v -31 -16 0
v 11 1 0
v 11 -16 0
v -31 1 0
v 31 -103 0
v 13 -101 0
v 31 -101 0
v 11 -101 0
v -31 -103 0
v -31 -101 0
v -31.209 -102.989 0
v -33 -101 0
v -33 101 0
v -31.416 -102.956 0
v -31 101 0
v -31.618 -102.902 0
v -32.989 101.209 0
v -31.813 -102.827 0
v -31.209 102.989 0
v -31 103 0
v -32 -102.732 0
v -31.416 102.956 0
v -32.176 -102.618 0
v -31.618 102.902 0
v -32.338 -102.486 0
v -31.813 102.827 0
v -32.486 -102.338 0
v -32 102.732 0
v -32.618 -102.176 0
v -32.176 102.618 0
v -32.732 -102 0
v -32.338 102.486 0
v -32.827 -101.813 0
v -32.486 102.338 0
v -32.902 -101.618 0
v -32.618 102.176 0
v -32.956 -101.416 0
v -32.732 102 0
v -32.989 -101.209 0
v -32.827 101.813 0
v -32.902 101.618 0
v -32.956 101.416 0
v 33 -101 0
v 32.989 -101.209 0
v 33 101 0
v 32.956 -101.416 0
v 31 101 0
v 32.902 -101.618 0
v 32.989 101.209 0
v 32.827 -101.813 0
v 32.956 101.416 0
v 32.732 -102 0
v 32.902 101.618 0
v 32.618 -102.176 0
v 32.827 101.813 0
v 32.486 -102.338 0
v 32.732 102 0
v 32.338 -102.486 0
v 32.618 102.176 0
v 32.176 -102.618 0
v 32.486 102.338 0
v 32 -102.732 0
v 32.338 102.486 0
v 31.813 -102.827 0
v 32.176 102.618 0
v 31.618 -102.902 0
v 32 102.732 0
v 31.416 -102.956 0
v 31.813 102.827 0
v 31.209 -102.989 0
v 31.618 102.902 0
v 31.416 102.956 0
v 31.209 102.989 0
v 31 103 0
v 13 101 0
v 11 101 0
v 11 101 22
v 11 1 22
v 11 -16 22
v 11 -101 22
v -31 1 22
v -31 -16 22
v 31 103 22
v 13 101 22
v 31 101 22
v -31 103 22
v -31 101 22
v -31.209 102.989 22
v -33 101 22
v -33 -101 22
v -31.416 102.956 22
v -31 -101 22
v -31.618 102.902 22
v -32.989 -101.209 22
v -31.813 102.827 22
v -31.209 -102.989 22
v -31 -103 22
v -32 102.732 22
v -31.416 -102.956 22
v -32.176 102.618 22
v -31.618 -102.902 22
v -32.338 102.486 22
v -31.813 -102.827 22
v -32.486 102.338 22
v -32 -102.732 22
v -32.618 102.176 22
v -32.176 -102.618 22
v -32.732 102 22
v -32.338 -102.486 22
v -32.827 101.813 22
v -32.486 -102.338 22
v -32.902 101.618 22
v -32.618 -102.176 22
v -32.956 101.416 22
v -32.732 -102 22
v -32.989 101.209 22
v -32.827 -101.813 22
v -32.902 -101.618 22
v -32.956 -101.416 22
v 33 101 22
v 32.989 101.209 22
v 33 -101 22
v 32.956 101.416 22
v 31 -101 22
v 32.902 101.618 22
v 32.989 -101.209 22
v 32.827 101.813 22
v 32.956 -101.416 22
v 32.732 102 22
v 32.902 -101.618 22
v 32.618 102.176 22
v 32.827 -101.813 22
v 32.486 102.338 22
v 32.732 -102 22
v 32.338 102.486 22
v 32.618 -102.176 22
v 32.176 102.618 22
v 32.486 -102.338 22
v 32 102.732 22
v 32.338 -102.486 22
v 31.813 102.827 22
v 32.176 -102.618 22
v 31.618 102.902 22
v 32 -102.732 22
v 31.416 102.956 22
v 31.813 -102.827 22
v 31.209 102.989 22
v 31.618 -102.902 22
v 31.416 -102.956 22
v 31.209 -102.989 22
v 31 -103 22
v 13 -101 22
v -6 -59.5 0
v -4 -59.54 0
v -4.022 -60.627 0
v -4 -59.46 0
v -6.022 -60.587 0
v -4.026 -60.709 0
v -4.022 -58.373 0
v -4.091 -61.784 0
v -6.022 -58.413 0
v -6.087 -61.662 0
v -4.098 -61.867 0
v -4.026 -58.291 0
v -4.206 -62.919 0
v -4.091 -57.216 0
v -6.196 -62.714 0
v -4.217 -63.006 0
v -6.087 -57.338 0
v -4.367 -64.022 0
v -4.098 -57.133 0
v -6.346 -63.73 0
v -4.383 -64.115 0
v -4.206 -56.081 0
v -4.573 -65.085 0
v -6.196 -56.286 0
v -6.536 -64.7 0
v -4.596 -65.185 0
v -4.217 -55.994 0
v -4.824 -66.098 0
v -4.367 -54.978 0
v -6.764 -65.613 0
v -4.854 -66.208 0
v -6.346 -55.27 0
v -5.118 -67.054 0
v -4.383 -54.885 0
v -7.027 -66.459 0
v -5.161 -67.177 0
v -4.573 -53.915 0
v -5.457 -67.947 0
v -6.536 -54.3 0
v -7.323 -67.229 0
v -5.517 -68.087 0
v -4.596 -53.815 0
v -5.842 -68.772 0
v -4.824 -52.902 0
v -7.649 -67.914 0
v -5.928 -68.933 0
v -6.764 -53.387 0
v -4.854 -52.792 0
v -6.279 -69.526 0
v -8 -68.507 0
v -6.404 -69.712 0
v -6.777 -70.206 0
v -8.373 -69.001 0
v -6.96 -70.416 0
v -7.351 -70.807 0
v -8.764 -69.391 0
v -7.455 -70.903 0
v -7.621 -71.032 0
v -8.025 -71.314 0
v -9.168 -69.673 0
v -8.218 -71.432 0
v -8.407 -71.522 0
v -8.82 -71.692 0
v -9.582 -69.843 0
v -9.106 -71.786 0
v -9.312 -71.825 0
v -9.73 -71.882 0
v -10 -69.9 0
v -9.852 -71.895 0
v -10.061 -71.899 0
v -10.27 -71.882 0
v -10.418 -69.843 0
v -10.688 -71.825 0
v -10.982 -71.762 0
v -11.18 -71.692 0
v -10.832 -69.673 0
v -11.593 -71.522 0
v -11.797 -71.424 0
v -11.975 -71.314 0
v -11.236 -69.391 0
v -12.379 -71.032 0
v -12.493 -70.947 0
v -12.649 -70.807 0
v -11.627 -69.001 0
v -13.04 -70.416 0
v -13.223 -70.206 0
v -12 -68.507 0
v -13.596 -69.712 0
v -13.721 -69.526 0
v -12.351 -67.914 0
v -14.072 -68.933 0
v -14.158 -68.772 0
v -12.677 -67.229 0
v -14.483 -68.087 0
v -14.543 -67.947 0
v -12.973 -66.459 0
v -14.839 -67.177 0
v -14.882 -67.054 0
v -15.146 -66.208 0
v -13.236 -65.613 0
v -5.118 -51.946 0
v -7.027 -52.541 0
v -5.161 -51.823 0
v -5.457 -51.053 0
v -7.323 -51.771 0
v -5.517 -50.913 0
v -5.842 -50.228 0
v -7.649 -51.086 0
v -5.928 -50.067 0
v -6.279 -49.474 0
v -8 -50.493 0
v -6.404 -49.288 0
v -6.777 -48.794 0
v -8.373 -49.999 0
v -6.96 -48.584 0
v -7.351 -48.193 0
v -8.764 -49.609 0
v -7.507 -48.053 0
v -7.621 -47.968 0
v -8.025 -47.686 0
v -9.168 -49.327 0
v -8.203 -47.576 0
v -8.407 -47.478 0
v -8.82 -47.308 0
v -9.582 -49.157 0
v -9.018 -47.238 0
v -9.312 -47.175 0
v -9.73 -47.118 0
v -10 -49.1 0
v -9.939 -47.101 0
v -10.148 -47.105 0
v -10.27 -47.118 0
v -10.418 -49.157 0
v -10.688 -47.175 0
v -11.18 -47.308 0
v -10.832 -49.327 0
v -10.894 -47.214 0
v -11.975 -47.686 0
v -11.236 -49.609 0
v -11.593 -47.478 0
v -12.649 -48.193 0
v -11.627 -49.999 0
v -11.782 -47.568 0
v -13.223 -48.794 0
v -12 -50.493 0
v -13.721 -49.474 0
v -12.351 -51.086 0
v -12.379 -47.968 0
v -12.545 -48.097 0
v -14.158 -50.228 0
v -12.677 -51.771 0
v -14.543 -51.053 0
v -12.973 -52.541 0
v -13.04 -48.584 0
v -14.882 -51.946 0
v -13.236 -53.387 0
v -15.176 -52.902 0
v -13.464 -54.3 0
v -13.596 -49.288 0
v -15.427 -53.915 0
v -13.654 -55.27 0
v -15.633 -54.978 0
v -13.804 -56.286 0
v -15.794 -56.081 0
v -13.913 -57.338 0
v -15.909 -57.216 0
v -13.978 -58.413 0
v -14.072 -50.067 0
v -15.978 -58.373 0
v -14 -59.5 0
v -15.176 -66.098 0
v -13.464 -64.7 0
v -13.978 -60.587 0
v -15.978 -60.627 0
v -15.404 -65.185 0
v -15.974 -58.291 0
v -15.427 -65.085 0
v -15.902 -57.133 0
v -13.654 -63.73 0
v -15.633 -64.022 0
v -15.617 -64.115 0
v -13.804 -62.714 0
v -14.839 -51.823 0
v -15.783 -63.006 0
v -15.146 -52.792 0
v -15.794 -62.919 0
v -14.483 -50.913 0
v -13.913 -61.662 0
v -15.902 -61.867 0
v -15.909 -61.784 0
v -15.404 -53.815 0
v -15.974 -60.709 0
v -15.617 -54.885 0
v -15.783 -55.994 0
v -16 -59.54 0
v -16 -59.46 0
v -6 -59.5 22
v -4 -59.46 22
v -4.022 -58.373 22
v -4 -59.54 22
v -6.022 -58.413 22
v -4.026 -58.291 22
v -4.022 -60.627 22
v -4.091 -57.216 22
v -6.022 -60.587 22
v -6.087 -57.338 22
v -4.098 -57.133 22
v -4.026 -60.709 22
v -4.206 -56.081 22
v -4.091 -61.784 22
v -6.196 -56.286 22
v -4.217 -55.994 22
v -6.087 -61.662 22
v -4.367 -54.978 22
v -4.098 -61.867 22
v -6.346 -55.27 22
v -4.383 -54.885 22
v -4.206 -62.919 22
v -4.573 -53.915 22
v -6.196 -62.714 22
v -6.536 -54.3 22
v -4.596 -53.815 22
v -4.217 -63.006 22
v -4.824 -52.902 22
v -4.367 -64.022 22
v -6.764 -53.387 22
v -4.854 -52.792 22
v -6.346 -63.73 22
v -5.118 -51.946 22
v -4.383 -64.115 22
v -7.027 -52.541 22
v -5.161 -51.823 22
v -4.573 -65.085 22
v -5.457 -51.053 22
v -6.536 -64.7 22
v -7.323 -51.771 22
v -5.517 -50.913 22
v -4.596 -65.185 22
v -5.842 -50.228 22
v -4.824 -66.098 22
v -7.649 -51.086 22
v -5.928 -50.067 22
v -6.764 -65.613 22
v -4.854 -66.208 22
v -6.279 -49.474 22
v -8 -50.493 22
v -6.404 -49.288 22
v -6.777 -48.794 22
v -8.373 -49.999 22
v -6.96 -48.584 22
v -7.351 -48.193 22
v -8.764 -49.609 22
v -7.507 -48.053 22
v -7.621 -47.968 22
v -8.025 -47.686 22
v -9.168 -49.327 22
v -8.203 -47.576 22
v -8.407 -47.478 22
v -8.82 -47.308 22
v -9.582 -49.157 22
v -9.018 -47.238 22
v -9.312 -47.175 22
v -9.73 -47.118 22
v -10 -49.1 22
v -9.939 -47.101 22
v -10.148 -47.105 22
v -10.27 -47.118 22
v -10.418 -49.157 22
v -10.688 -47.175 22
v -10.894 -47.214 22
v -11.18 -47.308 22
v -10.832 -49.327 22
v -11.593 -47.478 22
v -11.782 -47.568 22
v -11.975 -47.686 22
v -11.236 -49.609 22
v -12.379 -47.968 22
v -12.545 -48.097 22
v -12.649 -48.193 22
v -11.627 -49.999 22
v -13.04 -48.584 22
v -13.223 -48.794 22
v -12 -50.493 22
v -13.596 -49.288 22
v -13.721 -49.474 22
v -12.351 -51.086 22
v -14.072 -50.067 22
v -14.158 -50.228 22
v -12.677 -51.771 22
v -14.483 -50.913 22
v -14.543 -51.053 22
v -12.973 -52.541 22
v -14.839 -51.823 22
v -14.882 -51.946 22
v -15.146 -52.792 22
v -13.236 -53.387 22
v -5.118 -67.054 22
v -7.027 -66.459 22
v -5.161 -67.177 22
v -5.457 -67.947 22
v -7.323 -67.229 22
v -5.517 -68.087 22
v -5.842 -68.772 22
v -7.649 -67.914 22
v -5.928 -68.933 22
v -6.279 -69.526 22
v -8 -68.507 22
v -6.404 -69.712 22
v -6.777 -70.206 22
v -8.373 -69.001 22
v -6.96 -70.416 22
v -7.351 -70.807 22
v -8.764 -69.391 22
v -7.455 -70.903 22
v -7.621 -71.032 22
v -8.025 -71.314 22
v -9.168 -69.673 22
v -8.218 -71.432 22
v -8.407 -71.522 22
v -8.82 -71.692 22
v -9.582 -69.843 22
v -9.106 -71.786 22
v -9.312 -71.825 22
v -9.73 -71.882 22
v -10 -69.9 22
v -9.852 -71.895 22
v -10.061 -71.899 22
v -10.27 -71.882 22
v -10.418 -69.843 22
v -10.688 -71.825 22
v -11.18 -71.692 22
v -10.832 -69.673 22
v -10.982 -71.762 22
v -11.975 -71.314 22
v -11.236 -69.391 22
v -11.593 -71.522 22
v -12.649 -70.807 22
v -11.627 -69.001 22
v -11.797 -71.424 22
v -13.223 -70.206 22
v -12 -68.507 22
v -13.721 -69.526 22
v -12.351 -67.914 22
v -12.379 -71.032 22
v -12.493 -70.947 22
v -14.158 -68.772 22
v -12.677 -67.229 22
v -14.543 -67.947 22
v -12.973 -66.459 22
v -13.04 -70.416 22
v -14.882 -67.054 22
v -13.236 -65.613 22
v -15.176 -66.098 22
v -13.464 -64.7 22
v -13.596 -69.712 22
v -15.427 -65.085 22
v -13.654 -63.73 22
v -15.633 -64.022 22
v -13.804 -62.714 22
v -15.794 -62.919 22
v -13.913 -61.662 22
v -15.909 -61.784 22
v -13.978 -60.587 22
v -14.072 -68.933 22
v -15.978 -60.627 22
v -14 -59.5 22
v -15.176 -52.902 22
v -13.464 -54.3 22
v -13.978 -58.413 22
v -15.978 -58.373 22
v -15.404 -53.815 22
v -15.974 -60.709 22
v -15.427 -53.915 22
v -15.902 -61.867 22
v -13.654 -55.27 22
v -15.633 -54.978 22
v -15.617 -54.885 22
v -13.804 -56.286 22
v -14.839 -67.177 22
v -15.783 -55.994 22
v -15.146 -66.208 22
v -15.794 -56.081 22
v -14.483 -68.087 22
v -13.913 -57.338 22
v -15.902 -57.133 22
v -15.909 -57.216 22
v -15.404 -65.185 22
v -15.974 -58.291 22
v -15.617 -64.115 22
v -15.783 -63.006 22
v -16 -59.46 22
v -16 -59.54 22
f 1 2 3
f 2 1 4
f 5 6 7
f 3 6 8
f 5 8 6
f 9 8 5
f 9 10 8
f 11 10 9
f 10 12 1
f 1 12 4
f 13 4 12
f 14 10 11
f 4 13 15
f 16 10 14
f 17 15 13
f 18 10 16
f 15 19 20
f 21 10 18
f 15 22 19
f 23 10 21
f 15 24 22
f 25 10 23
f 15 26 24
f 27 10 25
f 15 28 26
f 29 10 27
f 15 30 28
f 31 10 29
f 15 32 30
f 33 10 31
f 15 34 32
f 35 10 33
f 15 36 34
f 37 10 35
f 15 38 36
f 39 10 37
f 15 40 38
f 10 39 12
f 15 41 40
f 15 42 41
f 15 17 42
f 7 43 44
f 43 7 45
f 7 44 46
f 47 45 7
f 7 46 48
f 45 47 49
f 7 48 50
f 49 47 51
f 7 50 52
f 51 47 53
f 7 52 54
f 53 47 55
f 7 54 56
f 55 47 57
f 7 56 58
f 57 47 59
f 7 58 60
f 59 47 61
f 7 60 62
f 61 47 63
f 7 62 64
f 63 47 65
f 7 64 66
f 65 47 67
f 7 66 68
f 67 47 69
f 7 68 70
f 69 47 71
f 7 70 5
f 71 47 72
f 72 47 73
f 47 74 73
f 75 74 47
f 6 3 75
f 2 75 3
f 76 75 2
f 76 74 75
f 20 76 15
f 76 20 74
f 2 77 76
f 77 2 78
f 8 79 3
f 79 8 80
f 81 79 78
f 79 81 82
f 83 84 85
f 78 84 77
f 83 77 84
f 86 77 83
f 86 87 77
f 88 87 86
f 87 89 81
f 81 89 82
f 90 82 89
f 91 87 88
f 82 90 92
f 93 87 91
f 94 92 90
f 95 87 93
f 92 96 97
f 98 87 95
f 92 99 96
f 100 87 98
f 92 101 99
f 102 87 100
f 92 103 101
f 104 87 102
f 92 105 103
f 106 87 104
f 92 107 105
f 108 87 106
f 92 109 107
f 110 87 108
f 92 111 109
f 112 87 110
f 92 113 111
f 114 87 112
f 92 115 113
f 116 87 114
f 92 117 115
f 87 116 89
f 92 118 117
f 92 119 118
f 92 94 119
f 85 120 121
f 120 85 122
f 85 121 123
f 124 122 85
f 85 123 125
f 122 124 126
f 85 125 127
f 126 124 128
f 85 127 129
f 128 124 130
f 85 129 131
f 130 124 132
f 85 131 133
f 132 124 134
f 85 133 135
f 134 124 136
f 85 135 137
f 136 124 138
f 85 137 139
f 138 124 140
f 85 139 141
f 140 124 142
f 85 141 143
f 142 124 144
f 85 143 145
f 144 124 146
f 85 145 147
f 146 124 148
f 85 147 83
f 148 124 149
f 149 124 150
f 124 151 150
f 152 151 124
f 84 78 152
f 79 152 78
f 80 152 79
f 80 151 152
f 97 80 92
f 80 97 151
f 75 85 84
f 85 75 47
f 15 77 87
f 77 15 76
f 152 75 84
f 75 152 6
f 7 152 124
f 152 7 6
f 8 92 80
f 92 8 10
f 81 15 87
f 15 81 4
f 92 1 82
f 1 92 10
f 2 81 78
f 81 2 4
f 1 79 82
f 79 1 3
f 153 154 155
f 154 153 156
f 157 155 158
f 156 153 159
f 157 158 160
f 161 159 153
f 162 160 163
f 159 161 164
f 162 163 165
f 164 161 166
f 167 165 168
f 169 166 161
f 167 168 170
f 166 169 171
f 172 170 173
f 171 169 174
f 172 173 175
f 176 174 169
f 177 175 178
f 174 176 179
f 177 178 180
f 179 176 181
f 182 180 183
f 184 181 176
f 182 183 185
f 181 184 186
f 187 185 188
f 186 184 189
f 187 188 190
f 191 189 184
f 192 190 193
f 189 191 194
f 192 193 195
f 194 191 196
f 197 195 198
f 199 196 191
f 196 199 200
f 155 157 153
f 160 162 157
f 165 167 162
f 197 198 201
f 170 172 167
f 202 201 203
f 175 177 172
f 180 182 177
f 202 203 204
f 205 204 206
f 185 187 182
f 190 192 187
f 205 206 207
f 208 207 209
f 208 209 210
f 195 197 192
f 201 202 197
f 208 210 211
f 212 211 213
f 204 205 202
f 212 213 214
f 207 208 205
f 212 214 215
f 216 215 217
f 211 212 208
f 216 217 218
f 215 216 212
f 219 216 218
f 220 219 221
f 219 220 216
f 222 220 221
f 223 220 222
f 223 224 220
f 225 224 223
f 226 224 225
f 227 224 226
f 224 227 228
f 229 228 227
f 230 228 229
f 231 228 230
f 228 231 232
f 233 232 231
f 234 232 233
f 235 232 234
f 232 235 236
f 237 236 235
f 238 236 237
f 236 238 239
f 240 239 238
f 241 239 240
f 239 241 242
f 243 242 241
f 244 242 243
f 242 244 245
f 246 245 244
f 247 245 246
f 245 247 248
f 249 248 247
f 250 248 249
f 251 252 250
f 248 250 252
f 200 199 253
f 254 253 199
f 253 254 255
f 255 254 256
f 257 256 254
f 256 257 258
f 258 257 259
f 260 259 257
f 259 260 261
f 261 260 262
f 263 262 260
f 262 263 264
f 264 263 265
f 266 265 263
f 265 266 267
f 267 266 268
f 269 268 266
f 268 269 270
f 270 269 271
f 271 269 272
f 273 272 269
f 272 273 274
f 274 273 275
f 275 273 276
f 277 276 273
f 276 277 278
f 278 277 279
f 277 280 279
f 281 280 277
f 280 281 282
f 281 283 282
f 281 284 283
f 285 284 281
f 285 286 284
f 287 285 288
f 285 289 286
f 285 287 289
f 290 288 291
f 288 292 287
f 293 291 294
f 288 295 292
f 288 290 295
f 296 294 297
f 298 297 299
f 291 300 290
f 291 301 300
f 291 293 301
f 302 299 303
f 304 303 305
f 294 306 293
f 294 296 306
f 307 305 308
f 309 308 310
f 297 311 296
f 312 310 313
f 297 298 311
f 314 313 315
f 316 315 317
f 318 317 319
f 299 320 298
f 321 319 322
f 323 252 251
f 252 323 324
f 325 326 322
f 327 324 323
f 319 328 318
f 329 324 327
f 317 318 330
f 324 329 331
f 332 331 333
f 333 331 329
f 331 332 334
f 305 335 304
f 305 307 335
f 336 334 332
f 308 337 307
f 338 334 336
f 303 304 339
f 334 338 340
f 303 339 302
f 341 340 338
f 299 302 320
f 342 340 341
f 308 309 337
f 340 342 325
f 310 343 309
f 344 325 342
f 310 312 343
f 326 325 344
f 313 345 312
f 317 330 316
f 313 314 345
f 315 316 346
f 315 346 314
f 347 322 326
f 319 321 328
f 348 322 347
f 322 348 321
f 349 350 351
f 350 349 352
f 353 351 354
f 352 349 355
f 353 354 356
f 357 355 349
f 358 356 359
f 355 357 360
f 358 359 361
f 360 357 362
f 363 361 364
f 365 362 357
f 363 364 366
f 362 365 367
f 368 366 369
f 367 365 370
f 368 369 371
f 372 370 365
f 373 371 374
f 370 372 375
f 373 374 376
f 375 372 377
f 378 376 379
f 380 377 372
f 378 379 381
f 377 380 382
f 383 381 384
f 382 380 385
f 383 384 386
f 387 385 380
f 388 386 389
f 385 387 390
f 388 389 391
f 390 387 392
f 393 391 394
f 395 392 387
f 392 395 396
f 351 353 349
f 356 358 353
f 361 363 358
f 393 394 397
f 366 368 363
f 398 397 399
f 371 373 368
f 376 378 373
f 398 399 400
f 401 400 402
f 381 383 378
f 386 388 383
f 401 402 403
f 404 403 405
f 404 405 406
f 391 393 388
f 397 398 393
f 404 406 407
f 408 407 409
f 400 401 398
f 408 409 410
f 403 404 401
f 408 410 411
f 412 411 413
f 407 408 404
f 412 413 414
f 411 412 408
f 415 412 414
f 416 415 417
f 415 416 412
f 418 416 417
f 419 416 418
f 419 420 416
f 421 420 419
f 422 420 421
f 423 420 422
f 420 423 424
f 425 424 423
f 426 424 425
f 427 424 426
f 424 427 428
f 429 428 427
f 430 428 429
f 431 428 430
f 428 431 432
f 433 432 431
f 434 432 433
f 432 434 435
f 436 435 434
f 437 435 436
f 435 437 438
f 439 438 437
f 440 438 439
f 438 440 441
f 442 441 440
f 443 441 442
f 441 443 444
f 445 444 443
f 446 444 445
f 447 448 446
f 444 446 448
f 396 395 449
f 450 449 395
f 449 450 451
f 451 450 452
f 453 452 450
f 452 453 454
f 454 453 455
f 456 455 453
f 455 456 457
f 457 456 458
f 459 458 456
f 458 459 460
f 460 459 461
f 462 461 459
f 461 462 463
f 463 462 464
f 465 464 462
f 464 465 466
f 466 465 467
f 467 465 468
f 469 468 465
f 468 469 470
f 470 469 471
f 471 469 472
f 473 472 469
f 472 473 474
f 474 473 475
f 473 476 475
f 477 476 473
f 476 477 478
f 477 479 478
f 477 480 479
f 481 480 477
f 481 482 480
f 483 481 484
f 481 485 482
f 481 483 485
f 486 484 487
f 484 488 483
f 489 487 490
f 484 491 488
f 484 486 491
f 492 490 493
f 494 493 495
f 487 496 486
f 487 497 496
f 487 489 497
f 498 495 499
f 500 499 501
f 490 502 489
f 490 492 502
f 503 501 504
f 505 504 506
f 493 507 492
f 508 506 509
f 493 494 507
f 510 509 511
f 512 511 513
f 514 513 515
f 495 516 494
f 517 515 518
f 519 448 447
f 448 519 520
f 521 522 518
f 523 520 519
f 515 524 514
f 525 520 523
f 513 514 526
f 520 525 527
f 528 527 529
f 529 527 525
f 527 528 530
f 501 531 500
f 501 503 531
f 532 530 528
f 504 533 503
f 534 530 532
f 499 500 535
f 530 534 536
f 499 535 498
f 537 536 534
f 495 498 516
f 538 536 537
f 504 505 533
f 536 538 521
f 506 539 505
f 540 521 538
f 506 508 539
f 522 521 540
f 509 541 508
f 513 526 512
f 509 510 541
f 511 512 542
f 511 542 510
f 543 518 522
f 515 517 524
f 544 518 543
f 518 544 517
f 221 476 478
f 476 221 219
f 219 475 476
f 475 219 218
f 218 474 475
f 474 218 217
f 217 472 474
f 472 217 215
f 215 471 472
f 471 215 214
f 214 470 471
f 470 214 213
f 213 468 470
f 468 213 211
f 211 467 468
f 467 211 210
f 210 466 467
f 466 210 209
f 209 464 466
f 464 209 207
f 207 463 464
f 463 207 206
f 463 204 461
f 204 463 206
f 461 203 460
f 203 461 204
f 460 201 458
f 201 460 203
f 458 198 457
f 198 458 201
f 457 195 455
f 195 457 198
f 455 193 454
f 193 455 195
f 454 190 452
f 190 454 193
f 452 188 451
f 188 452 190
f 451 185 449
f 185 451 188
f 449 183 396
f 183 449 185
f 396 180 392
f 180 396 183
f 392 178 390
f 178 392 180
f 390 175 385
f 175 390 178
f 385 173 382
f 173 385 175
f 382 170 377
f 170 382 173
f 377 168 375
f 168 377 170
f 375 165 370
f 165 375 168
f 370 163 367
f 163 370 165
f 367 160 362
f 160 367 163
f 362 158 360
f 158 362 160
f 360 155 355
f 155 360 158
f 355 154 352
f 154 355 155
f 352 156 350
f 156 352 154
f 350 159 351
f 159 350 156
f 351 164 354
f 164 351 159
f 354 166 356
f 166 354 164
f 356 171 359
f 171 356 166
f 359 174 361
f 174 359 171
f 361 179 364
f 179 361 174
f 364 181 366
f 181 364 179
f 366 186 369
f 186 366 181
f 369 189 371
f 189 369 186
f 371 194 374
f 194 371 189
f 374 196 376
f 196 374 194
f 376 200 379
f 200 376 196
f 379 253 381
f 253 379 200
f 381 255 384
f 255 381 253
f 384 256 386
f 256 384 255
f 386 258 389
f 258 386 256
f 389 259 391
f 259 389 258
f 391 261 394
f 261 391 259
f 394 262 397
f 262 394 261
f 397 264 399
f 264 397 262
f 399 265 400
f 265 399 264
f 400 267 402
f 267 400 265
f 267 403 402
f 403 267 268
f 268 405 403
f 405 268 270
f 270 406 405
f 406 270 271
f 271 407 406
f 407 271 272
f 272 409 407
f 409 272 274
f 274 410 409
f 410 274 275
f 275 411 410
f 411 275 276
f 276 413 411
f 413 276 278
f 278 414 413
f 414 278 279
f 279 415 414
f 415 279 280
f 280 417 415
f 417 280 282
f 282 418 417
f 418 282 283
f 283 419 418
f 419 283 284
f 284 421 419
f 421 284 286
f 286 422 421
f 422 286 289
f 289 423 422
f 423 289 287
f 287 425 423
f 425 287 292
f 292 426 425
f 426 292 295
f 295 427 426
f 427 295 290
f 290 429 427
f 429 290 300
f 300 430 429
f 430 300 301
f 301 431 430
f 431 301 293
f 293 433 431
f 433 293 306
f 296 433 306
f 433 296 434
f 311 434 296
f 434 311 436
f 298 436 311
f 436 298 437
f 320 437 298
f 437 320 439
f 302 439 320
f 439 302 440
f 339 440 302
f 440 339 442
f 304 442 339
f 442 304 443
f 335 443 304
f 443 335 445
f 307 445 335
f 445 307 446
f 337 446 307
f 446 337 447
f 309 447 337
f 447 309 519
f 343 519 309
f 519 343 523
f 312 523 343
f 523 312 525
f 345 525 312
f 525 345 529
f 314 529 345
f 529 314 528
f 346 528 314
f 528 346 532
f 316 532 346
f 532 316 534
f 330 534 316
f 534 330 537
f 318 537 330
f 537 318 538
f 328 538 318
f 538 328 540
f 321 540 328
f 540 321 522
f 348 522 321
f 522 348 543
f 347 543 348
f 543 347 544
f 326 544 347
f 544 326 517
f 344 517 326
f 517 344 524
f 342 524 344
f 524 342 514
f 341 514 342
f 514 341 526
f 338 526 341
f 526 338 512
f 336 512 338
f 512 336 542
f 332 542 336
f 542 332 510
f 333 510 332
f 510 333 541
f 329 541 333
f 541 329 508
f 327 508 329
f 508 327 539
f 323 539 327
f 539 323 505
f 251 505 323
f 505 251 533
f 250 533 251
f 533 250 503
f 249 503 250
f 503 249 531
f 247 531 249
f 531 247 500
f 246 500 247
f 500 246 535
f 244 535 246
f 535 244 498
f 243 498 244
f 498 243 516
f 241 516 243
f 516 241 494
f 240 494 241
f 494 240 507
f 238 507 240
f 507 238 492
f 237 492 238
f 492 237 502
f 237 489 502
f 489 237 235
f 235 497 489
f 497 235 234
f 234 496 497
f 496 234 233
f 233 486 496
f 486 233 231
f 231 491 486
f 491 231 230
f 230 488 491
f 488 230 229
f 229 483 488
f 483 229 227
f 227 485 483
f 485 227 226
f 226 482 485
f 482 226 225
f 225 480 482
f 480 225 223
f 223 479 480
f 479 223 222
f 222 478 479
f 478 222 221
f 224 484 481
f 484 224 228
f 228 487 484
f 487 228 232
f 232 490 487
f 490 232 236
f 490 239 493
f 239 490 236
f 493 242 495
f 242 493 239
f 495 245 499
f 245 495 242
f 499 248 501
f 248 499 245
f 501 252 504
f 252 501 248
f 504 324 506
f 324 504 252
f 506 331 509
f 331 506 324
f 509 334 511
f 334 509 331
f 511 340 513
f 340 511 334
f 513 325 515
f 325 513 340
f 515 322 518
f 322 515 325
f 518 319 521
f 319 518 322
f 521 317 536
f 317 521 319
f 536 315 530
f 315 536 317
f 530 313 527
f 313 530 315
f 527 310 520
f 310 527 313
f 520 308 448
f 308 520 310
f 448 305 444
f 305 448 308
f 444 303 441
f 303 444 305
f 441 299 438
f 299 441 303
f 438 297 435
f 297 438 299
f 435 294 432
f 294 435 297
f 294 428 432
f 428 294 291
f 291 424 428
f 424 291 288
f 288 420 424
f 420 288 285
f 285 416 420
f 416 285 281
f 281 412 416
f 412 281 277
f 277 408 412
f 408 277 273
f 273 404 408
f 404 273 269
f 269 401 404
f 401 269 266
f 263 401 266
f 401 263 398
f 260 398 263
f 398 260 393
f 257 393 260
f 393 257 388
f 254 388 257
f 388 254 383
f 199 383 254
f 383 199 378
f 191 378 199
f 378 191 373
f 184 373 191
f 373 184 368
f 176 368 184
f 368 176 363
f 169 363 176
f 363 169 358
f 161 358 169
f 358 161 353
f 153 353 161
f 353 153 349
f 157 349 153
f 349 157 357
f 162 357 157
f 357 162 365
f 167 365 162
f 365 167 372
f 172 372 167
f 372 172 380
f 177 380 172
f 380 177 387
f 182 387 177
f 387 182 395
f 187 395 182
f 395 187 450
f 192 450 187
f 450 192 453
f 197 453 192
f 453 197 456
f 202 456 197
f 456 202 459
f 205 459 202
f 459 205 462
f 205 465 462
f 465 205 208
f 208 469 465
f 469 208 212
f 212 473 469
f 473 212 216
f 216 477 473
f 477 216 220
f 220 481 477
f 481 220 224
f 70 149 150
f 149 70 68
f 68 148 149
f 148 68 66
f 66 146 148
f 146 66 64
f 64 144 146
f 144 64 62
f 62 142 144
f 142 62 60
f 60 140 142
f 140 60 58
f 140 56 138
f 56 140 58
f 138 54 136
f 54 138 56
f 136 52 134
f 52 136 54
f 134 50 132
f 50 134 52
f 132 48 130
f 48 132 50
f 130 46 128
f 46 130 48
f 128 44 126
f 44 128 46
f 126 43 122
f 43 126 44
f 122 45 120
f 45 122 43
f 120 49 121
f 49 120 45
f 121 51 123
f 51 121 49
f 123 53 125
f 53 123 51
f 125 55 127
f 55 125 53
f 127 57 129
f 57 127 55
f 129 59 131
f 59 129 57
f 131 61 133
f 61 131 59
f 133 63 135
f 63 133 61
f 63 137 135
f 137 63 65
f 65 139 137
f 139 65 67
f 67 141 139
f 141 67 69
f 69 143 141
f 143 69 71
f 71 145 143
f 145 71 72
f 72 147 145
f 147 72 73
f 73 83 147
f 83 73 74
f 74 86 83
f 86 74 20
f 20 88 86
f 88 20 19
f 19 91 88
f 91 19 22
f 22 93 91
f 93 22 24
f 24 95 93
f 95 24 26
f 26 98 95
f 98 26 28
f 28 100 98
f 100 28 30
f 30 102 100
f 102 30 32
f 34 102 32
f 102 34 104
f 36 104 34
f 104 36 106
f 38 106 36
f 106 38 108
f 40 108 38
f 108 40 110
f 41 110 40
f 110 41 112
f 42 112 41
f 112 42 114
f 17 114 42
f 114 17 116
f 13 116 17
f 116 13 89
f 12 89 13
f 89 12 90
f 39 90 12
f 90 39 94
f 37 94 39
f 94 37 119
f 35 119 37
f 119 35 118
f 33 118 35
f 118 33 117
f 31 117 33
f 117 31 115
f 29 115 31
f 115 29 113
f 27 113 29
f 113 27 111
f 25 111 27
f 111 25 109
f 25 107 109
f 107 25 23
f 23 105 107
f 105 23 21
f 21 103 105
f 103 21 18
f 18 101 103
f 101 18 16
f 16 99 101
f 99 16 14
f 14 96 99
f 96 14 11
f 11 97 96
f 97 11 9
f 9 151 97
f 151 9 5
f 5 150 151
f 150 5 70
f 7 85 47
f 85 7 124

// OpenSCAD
$fn = 60;

buffer = 5;
thickness = 0.4 * buffer;
toothbrush_width = 20;
picks_width = 40;
picks_y = 85; // Container is 87, picks are ~80
toothpaste_y = 100;
separator = thickness;
box_x = picks_width + thickness + toothbrush_width; // Save room for wall
box_y = 202;                                        // Toothbrush Length
z = 22;                                             // Tallest thing is the toothpaste tube
picks_paste_gap = box_y - picks_y - toothpaste_y;

union()
{
    // TODO: Doesn't need to be full wall
    translate(v = [ (box_x / 2) - toothbrush_width + (thickness / 2), 0, 0 ])
    {
        linear_extrude(height = z)
        {
            square([ thickness, box_y ], center = true);
        }
    }

    // Gap Fill
    translate(v = [
        -(box_x / 2) + toothbrush_width + (thickness / 2), (box_y / 2) - (toothpaste_y + (picks_paste_gap / 2)), 0
    ])
    {
        linear_extrude(height = z)
        {
            square(
                [
                    picks_width + thickness,
                    picks_paste_gap,
                ],
                center = true);
        };
    }

    // Floss Pick Oval
    translate(v = [ -(box_x / 2) + toothbrush_width + (thickness / 2), -(picks_paste_gap + (picks_y / 2)), 0 ])
        linear_extrude(height = z)
    {
        difference()
        {
            offset(thickness) scale([ 1, 2.6 ]) circle(d = 10 - thickness);
            scale([ 1, 2.6 ]) circle(d = 10 - thickness);
        }
    }

    // OUTER BOX

    linear_extrude(height = z)
    {
        difference()
        {
            offset(thickness) square([ box_x, box_y ], center = true);
            square([ box_x, box_y ], center = true);
        }
    }
}
